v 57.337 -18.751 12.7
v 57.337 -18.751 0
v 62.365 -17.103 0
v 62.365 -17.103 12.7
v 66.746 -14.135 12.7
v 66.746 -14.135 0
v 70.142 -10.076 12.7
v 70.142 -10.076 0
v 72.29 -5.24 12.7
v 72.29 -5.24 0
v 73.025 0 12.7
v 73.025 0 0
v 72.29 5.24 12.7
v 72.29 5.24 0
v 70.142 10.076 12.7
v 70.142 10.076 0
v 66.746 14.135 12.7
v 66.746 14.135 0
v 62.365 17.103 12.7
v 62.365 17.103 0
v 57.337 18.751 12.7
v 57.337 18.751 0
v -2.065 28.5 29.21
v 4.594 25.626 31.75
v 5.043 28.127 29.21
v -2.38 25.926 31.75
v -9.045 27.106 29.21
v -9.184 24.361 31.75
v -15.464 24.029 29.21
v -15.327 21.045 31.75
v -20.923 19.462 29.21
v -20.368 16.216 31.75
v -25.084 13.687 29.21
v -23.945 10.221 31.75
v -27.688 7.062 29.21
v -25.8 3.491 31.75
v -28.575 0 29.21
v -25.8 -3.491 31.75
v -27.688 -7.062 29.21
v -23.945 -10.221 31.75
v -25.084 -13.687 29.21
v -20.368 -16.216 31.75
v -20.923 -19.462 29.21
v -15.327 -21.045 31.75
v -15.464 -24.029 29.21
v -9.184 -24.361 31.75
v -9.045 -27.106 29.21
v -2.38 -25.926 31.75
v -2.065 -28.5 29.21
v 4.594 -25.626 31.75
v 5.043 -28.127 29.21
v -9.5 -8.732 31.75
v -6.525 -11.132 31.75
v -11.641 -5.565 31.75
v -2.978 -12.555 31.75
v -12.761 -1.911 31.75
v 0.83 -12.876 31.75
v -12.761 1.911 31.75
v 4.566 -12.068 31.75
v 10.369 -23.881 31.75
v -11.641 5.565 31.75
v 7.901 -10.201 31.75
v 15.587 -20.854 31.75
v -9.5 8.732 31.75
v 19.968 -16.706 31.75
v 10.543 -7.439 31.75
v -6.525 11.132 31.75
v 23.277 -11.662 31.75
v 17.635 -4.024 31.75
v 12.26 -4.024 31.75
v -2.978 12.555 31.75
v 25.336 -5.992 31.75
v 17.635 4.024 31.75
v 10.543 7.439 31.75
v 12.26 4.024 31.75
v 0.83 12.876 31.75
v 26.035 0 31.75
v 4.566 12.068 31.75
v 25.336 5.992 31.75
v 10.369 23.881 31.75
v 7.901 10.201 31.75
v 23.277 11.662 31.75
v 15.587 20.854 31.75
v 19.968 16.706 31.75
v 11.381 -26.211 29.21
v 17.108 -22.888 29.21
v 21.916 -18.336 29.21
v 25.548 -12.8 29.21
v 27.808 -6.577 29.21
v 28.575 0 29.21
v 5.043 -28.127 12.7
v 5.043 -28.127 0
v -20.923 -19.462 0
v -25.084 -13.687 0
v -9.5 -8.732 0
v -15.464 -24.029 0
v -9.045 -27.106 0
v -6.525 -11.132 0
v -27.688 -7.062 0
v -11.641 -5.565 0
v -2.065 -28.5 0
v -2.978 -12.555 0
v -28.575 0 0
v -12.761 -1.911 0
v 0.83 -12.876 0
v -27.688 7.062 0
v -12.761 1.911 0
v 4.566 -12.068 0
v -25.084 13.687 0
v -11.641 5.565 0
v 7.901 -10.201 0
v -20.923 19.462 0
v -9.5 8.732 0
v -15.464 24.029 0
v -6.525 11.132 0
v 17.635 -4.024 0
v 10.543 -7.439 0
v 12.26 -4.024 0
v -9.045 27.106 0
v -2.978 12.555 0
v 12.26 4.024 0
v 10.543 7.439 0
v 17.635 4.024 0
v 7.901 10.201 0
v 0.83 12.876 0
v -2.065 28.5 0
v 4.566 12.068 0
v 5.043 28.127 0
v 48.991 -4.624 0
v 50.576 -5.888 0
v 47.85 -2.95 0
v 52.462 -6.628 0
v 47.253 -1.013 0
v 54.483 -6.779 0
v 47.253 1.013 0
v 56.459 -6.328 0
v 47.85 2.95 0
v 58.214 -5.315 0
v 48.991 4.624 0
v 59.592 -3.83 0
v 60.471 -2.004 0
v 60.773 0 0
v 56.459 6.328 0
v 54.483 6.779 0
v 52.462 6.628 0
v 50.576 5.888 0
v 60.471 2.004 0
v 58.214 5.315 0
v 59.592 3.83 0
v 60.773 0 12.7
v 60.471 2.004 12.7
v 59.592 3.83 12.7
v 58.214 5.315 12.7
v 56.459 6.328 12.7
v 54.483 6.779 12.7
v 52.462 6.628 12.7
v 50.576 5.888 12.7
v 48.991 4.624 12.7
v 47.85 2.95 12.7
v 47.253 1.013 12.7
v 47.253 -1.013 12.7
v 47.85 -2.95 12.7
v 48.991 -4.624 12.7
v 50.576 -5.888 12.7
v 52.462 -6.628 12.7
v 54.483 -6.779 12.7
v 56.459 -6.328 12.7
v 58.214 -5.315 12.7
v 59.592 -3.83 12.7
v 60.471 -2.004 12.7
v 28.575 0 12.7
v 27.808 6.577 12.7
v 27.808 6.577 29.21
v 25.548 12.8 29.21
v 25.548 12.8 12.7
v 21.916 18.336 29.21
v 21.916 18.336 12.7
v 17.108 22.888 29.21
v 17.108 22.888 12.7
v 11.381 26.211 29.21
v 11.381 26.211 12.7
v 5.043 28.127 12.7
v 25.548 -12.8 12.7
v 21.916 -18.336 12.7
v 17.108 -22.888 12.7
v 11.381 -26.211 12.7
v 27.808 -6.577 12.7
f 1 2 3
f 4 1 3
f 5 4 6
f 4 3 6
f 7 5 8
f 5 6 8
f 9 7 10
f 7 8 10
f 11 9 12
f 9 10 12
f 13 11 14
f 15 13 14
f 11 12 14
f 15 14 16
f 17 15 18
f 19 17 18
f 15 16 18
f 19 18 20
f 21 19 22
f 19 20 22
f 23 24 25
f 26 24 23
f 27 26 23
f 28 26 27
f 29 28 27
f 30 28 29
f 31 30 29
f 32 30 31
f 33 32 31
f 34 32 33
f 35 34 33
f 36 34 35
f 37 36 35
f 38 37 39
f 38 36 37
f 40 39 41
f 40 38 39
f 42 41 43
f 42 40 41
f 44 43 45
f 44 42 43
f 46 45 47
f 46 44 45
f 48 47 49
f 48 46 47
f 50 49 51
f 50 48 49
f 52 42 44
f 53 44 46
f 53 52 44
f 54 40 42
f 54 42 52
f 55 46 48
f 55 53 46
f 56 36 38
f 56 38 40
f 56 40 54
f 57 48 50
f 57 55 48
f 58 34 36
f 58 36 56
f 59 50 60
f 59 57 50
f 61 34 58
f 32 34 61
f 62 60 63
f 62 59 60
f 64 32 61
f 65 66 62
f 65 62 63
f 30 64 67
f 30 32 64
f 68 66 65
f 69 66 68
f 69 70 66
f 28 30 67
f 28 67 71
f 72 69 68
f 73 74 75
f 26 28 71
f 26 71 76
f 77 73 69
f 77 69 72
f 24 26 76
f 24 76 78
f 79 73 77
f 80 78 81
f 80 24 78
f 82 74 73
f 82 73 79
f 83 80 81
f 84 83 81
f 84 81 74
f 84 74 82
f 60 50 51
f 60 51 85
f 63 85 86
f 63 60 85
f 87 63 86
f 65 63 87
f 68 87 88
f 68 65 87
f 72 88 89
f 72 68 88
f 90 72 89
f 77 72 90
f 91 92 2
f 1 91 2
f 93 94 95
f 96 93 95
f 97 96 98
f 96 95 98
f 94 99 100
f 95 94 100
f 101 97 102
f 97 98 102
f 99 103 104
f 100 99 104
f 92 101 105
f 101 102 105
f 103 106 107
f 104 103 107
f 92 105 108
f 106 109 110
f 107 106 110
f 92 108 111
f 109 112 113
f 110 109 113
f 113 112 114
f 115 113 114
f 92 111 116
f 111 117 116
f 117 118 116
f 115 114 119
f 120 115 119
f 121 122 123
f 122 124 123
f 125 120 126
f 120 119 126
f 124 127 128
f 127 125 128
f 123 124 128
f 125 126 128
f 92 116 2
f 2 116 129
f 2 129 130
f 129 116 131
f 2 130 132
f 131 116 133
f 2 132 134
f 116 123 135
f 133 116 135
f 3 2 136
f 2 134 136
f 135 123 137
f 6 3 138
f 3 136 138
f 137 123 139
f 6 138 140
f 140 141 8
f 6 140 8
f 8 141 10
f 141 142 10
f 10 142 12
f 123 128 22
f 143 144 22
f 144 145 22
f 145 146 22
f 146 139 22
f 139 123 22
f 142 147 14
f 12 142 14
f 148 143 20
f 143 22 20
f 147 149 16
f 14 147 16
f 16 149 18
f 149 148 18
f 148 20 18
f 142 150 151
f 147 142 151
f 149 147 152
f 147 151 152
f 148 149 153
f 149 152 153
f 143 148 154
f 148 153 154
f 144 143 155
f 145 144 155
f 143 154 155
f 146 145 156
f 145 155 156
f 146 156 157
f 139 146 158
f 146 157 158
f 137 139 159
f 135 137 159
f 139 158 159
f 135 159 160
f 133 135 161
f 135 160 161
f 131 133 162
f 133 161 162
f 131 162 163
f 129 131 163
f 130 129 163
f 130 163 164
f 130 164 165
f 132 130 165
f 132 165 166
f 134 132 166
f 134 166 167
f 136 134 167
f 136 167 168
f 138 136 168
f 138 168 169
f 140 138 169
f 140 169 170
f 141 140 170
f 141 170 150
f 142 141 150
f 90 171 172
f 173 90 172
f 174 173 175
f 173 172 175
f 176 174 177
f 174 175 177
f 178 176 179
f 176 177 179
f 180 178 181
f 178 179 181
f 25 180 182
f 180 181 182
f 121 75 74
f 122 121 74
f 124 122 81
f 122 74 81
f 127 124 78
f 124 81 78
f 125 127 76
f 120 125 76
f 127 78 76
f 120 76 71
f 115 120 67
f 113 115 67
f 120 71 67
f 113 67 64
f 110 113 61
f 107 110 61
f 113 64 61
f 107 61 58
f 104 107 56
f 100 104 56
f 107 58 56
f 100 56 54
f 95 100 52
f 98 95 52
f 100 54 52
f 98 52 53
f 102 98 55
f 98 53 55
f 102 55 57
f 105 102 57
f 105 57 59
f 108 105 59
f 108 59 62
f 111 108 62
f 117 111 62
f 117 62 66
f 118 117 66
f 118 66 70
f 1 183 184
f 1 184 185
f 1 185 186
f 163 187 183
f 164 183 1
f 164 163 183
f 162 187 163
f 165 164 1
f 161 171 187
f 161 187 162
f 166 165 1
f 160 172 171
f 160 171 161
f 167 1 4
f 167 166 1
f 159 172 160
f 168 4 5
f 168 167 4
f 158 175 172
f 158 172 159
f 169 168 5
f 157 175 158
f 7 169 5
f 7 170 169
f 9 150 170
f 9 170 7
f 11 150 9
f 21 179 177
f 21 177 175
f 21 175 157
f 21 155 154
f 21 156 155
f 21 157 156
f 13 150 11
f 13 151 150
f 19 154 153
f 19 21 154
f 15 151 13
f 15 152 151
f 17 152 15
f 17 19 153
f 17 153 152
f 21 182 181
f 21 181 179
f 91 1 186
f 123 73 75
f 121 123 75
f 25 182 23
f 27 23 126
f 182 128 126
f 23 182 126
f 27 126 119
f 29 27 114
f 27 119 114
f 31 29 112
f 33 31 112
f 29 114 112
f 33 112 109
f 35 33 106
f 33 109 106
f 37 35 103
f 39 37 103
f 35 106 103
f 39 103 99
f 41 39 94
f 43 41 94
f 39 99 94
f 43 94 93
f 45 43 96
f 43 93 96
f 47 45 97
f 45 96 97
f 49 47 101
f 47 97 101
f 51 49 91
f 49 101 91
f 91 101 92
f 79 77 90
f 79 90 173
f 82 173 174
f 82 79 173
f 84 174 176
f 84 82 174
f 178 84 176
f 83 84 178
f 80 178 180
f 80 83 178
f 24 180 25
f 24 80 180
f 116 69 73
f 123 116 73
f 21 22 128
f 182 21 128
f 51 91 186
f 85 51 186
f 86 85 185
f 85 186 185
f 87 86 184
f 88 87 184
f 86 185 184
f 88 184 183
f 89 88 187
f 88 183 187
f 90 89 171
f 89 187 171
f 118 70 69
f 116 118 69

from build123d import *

# Parameters (mm, degrees)
F1_DEPTH = 12.7
F2_DEPTH = 31.75
F3_R     = 6.798406
F4_DEPTH = 25.4
F5_SIZE  = 2.54
F7_DEPTH = 31.751


with BuildPart() as f1:
    # F0 (on Top) → F1 (new body)
    with BuildSketch(Plane.XY):
        with BuildLine():
            ThreePointArc((5.042647, -28.126541), (21.916025, -18.336262), (28.575, 0))
            ThreePointArc((28.575, 0), (21.916025, 18.336262), (5.042647, 28.126541))
            ThreePointArc((5.042647, 28.126541), (-28.575, 0), (5.042647, -28.126541))
        make_face()
        with BuildLine():
            ThreePointArc((5.042647, 28.126541), (21.916025, 18.336262), (28.575, 0))
            ThreePointArc((28.575, 0), (21.916025, -18.336262), (5.042647, -28.126541))
            Line((5.042647, -28.126541), (57.336765, -18.751028))
            ThreePointArc((57.336765, -18.751028), (73.025, 0), (57.336765, 18.751028))
            Line((57.336765, 18.751028), (5.042647, 28.126541))
        make_face()
    extrude(amount=F1_DEPTH)

    # F0 (on Top) → F2 (join)
    with BuildSketch(Plane.XY):
        with BuildLine():
            ThreePointArc((5.042647, -28.126541), (21.916025, -18.336262), (28.575, 0))
            ThreePointArc((28.575, 0), (21.916025, 18.336262), (5.042647, 28.126541))
            ThreePointArc((5.042647, 28.126541), (-28.575, 0), (5.042647, -28.126541))
        make_face()
    extrude(amount=F2_DEPTH)

    # F3 (on face) → F4 (cut)
    with BuildSketch(Plane.XY.offset(12.7)):
        with Locations((53.975, 0)):
            Circle(F3_R)
    extrude(amount=-F4_DEPTH, mode=Mode.SUBTRACT)

    # F5
    f5_edges = [f1.edges().sort_by_distance(p)[0] for p in [
        (-5.042647, 28.126541, 31.75),
    ]]
    chamfer(f5_edges, length=F5_SIZE)

    # F6 (on face) → F7 (cut, through all)
    with BuildSketch(Plane.XY.offset(31.75)):
        with BuildLine():
            Line((17.635341, 4.024172), (12.259626, 4.024172))
            ThreePointArc((12.259626, 4.024172), (-12.903193, 0), (12.259626, -4.024172))
            Line((12.259626, -4.024172), (17.635341, -4.024172))
            Line((17.635341, -4.024172), (17.635341, 4.024172))
        make_face()
    extrude(amount=-F7_DEPTH, mode=Mode.SUBTRACT)


solid = f1.part
